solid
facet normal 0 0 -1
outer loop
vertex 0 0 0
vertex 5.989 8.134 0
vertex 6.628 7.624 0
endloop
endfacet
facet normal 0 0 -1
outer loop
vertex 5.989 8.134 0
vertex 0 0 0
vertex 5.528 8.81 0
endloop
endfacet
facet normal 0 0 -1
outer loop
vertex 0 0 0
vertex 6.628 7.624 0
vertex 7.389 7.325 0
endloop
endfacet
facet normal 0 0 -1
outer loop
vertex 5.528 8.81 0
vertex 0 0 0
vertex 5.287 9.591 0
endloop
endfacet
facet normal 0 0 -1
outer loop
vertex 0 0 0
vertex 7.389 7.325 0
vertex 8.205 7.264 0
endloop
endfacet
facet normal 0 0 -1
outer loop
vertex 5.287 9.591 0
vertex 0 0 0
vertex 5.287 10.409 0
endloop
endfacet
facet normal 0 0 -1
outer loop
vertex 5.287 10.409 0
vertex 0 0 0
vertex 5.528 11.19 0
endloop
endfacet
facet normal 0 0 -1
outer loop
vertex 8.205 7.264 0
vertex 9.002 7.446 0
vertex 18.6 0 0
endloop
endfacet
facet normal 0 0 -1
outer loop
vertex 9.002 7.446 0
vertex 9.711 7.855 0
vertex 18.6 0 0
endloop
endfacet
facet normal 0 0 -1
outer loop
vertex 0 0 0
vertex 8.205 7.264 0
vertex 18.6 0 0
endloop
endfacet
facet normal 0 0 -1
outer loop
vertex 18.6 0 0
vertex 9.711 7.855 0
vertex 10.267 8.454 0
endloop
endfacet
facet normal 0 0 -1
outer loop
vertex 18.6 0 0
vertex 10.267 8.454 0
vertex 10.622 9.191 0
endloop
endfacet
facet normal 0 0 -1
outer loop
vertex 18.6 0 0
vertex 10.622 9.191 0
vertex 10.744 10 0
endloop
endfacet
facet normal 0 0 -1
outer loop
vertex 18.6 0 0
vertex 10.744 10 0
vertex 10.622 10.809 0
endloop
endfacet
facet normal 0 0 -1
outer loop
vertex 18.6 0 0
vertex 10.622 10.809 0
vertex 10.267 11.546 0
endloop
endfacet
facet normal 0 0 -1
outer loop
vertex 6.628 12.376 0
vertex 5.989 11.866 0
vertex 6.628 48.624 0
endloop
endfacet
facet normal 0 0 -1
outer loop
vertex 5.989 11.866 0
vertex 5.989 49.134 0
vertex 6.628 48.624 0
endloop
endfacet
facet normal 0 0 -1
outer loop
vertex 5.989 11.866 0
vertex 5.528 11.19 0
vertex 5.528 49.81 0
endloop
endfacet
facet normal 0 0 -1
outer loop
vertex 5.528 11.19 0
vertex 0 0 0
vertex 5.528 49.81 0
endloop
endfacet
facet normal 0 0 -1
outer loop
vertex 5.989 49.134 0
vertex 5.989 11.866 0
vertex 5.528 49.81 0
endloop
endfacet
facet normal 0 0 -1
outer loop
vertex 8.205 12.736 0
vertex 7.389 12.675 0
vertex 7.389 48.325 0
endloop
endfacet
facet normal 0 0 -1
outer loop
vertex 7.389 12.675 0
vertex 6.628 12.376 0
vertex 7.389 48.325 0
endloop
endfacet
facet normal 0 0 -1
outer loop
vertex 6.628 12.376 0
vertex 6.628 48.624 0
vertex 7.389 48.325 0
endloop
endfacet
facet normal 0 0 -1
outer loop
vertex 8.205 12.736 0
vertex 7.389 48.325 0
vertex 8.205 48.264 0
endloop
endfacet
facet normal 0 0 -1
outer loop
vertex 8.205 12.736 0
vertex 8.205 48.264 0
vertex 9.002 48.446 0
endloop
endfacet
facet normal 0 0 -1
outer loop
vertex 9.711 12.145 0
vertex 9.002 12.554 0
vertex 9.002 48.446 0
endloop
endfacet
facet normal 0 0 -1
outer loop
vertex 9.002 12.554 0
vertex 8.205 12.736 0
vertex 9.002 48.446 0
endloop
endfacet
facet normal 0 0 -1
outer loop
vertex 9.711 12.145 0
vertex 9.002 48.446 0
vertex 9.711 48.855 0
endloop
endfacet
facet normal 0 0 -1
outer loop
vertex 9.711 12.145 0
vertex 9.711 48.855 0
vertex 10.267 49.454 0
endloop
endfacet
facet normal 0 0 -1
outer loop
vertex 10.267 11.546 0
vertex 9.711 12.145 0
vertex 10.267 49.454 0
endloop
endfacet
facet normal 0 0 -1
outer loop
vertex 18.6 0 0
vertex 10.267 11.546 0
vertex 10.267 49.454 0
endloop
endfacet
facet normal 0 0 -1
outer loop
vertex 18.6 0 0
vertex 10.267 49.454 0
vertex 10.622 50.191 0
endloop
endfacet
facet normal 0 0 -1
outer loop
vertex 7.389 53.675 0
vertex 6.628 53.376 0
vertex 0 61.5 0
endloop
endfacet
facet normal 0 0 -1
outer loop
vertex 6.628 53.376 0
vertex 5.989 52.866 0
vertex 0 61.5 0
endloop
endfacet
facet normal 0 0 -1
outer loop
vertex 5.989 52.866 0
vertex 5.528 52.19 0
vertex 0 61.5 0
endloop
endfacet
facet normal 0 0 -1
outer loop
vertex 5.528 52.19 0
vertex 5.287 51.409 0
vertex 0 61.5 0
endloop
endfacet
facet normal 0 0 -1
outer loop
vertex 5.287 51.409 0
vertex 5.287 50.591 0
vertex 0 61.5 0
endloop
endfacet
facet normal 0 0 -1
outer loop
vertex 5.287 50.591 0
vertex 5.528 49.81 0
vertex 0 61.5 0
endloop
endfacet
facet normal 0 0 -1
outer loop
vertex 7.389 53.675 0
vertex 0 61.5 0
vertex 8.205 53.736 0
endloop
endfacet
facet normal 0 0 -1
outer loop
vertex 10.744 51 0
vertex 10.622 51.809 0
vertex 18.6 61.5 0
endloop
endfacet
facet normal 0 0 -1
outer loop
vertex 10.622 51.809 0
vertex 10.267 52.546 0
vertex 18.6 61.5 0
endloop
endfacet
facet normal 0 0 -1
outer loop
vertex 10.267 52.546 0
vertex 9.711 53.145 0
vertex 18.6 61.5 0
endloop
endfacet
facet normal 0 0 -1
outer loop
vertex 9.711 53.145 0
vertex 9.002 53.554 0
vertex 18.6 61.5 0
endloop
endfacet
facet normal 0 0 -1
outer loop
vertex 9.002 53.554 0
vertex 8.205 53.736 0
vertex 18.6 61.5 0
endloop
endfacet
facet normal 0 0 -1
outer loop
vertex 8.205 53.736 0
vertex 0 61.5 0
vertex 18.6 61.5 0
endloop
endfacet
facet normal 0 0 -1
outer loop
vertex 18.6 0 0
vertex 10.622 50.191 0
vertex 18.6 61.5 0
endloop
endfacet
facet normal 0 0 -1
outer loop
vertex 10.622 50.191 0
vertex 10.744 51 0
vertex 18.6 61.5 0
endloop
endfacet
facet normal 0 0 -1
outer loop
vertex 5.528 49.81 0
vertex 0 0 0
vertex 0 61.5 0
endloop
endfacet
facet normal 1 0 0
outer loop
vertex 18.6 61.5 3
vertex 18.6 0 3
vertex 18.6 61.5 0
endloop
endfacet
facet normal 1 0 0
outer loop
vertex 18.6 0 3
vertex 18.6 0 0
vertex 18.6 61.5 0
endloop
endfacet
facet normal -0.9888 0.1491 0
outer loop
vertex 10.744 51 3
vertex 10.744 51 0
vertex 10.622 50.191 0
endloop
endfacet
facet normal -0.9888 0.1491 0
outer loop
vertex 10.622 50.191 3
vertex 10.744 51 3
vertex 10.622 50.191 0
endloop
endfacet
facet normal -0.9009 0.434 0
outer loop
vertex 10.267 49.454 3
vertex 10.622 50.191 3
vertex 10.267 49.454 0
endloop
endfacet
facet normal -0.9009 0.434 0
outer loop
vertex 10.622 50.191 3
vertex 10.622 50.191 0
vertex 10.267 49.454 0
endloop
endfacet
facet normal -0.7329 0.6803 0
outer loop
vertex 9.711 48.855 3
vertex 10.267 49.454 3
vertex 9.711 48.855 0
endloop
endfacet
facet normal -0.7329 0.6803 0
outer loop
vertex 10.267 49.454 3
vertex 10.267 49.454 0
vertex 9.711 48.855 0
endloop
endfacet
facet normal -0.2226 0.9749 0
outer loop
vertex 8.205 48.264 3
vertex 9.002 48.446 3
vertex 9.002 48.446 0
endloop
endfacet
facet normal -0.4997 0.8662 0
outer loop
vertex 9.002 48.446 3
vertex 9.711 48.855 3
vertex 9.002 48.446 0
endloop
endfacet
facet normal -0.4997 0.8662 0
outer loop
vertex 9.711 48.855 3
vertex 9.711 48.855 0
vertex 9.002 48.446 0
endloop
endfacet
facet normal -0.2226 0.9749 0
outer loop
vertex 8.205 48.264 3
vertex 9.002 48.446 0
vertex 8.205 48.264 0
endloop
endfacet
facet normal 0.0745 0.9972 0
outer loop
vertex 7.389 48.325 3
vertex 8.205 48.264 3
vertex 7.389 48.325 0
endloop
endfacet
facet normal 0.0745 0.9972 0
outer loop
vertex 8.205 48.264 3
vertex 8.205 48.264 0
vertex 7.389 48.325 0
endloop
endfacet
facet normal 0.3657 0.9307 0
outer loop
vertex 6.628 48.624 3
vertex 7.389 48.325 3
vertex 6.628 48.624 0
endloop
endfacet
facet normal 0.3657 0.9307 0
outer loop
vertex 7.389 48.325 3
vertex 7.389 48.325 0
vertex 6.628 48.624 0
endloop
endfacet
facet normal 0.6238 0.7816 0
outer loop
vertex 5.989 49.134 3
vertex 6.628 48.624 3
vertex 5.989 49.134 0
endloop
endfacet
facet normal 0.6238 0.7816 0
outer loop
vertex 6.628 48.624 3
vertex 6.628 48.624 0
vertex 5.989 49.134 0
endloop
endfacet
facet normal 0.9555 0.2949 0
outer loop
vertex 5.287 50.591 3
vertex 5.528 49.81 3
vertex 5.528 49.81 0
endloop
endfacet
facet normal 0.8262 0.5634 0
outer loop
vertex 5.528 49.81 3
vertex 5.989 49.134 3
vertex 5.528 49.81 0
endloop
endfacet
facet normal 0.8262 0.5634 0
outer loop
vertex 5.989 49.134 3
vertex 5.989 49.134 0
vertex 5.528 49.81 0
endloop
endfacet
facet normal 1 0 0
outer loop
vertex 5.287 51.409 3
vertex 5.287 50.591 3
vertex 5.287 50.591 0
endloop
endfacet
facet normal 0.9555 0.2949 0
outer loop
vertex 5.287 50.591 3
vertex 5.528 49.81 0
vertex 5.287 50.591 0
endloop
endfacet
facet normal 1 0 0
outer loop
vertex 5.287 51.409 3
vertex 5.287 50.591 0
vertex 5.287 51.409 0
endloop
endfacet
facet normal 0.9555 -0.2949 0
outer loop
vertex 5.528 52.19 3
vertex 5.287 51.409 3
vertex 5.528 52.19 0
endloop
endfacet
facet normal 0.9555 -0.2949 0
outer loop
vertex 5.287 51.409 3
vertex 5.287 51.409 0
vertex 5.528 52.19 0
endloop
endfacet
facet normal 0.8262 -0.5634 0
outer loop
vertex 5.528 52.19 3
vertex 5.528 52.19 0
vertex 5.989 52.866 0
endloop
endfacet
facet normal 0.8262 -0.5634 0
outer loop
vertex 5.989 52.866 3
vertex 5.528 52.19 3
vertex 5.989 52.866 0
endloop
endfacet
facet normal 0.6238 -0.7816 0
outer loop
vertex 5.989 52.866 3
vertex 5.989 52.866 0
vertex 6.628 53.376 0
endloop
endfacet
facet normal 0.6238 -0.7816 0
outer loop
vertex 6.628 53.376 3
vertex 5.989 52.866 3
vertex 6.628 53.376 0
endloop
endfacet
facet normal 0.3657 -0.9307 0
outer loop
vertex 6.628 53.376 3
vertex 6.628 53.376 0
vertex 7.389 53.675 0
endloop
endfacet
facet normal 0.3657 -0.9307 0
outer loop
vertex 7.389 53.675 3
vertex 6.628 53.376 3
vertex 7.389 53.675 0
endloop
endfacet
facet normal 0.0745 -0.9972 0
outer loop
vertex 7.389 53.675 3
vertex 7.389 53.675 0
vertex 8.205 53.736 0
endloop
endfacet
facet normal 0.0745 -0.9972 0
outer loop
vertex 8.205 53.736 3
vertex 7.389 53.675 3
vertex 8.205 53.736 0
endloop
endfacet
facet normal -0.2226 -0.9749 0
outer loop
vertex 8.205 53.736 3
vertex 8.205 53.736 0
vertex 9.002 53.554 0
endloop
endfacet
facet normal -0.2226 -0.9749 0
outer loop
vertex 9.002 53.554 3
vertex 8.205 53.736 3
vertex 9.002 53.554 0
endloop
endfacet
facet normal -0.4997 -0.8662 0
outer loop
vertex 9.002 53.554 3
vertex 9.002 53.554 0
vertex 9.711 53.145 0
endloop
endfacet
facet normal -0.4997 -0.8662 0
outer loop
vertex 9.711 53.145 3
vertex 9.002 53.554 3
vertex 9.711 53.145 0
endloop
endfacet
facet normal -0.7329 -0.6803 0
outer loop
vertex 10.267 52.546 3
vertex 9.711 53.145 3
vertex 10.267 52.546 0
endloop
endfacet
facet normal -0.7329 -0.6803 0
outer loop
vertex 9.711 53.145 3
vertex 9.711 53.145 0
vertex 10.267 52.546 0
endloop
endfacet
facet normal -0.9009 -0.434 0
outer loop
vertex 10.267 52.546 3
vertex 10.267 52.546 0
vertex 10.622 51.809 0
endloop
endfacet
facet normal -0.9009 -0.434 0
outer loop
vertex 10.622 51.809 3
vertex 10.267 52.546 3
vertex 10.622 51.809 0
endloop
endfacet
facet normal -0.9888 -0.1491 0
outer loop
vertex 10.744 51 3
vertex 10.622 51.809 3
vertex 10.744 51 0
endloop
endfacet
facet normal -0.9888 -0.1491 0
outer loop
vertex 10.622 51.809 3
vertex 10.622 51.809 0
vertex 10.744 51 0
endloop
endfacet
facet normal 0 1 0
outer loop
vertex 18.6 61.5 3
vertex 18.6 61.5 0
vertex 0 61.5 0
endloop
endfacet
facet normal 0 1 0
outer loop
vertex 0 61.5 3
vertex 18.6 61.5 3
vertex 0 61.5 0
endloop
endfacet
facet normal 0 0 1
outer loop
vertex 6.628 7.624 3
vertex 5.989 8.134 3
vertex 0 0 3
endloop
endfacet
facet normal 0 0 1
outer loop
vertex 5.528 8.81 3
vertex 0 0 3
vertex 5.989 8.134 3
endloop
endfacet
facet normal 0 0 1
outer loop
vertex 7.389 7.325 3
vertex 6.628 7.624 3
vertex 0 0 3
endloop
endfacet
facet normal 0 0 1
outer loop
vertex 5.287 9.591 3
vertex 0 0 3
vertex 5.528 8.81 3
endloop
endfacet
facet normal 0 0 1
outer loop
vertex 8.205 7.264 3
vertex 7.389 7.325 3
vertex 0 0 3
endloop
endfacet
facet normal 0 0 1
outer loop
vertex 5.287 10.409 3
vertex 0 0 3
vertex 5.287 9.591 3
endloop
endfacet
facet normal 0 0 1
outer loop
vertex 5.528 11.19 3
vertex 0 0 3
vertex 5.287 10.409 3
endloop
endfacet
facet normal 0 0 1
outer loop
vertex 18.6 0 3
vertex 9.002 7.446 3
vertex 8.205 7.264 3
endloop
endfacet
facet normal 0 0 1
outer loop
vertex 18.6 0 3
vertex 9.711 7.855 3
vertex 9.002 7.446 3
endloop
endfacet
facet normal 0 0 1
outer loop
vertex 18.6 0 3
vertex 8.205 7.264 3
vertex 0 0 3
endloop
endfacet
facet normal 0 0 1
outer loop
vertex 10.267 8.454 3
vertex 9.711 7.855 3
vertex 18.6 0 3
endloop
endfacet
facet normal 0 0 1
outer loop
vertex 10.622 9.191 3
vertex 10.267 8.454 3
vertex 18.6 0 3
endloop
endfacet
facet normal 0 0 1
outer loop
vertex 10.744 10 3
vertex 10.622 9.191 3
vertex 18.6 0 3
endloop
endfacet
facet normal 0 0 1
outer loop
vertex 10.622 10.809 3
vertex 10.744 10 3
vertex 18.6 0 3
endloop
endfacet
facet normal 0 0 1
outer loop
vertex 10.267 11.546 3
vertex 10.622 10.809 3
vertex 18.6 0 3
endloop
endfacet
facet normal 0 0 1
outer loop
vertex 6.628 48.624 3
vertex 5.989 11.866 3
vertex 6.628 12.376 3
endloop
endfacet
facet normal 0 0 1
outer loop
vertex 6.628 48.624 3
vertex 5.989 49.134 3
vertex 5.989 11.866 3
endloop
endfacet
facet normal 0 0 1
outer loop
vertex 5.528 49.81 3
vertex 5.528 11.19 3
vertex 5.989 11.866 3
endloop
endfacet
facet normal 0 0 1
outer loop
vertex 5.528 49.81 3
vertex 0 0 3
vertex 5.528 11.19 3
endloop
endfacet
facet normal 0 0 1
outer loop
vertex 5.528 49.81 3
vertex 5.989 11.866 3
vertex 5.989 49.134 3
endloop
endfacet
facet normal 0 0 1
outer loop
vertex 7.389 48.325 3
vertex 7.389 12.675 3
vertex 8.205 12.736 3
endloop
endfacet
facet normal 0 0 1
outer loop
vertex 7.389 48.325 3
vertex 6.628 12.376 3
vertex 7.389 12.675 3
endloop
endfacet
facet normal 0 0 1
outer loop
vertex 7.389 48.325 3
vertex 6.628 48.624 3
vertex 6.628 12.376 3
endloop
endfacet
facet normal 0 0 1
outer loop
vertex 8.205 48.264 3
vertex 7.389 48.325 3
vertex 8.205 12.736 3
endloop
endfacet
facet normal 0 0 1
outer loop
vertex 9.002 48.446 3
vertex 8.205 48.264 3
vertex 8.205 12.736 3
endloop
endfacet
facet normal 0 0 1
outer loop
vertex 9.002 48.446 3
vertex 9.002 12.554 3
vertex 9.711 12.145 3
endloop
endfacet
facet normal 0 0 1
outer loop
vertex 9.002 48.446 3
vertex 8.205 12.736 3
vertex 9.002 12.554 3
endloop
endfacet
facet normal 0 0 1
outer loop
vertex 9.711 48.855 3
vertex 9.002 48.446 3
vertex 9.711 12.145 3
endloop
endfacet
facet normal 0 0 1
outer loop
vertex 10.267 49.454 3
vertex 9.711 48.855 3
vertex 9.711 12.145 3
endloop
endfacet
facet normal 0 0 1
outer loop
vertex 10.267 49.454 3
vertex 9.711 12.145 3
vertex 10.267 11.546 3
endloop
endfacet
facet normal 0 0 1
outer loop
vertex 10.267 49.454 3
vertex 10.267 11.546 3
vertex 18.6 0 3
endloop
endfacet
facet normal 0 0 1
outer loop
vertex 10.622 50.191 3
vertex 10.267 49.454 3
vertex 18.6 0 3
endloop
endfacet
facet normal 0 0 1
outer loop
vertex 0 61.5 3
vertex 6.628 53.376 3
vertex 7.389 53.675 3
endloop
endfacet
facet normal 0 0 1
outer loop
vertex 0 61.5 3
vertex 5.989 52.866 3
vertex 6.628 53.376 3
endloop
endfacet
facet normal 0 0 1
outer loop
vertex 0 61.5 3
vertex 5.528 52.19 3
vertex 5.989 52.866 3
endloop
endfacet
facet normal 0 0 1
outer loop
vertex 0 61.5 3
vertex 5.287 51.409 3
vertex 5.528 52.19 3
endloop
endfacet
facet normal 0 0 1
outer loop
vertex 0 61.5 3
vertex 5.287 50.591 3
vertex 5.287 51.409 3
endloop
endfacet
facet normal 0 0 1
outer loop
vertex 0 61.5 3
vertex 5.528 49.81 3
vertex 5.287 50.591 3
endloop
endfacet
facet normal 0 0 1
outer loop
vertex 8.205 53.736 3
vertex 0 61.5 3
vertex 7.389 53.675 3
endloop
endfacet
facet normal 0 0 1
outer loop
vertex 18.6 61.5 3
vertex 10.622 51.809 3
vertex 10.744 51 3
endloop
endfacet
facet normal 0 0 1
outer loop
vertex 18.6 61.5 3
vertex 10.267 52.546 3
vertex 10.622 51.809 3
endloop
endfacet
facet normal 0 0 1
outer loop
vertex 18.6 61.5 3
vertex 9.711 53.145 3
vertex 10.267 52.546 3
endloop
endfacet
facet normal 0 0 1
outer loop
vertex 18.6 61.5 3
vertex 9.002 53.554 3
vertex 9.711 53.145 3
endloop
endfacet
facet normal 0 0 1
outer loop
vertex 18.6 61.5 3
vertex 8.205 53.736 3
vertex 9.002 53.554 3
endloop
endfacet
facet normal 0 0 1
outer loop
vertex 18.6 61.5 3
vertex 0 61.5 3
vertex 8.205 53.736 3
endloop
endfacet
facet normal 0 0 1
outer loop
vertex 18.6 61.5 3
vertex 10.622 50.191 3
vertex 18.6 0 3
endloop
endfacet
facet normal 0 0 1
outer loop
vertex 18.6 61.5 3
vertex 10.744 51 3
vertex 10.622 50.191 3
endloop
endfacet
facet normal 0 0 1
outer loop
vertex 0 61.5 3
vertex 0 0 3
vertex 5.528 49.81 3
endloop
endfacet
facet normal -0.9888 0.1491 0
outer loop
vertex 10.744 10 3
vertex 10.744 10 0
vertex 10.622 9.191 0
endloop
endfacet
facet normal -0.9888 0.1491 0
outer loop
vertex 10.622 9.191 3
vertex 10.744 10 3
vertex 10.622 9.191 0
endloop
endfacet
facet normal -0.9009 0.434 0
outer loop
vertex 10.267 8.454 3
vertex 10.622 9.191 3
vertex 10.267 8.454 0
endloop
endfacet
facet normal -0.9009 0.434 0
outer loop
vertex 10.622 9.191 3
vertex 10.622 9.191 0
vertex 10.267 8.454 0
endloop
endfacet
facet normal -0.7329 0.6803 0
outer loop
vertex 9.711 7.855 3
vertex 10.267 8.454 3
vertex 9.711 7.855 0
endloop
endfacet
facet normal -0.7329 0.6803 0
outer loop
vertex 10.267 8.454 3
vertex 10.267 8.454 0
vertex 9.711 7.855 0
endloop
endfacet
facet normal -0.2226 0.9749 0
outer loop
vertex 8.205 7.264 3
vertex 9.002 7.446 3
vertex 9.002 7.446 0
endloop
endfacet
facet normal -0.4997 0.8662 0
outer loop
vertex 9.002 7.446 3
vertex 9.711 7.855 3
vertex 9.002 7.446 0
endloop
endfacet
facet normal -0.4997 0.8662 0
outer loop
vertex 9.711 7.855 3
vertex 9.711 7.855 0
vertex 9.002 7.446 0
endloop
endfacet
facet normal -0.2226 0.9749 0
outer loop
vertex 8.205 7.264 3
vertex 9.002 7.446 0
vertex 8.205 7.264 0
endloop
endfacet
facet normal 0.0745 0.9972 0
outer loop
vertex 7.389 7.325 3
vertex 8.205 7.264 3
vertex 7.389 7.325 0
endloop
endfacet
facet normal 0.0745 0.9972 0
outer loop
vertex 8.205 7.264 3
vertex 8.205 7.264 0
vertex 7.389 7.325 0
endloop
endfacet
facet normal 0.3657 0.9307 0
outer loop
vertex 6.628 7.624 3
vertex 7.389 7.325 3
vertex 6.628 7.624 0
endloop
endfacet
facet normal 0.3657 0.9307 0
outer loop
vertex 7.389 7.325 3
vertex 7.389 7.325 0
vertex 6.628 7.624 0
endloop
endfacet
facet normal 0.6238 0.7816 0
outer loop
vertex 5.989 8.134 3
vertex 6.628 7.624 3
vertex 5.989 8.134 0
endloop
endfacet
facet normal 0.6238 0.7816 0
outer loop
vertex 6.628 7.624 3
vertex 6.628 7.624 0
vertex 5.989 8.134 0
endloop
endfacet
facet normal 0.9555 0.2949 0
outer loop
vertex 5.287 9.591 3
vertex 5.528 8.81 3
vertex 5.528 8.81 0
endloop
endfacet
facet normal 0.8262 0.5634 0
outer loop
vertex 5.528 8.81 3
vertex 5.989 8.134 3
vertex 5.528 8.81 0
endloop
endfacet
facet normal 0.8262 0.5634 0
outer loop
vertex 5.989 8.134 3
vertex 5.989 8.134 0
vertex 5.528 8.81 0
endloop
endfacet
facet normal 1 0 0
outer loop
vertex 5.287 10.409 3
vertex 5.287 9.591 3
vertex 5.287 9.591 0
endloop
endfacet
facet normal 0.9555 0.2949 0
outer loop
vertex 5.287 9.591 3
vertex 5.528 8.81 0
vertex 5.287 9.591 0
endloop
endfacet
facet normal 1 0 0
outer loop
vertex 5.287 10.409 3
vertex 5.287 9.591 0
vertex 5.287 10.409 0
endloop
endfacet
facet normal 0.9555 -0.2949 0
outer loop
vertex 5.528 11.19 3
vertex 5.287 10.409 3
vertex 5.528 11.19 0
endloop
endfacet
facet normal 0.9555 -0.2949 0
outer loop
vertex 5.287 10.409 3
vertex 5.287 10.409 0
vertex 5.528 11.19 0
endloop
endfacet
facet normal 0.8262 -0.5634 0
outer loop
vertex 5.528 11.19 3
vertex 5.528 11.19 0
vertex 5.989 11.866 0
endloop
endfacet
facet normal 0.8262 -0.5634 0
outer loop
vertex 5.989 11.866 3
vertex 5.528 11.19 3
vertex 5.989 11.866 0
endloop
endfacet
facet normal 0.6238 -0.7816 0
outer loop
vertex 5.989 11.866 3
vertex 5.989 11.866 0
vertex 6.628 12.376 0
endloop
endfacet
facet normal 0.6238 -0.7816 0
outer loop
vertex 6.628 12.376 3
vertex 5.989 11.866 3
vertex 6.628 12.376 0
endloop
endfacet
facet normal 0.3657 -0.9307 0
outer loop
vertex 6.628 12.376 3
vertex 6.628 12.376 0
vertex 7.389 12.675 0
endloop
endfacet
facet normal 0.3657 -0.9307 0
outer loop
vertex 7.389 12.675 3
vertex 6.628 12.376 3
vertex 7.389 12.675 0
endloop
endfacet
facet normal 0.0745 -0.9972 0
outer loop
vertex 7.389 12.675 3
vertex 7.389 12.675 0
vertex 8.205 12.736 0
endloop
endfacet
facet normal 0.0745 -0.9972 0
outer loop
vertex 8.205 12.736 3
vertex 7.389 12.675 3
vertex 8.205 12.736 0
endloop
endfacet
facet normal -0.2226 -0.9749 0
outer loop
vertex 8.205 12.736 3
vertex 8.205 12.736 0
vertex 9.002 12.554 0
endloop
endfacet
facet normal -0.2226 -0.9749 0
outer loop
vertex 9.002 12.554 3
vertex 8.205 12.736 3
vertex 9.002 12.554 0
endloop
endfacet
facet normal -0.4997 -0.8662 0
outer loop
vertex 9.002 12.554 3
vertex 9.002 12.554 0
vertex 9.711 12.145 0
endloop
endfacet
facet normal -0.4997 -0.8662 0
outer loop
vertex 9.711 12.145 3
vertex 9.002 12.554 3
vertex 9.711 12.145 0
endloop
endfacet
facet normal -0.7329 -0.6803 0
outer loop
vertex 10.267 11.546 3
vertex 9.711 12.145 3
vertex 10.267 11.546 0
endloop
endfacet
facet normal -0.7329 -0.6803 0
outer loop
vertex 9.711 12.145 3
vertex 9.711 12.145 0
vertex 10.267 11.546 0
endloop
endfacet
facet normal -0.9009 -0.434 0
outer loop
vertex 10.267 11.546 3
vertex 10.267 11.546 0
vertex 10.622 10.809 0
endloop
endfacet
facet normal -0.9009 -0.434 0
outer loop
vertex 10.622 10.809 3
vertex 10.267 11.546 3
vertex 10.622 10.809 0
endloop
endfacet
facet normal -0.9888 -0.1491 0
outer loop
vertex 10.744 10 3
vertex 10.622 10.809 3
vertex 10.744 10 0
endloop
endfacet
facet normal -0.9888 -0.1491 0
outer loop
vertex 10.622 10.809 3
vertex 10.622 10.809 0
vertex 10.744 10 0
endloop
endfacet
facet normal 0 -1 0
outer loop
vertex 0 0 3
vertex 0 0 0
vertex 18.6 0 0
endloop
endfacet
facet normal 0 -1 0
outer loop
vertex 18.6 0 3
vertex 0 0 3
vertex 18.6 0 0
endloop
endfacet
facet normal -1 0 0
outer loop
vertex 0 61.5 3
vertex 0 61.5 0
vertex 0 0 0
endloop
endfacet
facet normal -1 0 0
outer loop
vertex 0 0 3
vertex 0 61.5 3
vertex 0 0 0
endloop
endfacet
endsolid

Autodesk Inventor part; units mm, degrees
ref_plane "YZ Plane" through (0, 0, 0) normal (1, 0, 0) x (0, 1, 0)
ref_plane "XZ Plane" through (0, 0, 0) normal (0, 1, 0) x (-1, 0, 0)
ref_plane "XY Plane" through (0, 0, 0) normal (0, 0, 1) x (1, 0, 0)
sketch "Sketch1" plane through (0, 0, 0) normal (0, 0, 1) x (1, 0, 0)
  line L0 (0, 0) -> (18.6, 0)
  line L1 (18.6, 0) -> (18.6, 61.5)
  line L2 (18.6, 61.5) -> (0, 61.5)
  line L3 (0, 61.5) -> (0, 0)
  circle A0 centre (8, 10) radius 2.7436
  circle A1 centre (8, 51) radius 2.7436
  dimension "d0" = 61.5
  dimension "d1" = 18.6
  dimension "d2" = 10
  dimension "d3" = 8
  dimension "d4" = 8
  dimension "d5" = 10.5
extrude "Extrusion1" add sketch "Sketch1" along normal blind 3
properties part number "pulley_tab_left_B"
